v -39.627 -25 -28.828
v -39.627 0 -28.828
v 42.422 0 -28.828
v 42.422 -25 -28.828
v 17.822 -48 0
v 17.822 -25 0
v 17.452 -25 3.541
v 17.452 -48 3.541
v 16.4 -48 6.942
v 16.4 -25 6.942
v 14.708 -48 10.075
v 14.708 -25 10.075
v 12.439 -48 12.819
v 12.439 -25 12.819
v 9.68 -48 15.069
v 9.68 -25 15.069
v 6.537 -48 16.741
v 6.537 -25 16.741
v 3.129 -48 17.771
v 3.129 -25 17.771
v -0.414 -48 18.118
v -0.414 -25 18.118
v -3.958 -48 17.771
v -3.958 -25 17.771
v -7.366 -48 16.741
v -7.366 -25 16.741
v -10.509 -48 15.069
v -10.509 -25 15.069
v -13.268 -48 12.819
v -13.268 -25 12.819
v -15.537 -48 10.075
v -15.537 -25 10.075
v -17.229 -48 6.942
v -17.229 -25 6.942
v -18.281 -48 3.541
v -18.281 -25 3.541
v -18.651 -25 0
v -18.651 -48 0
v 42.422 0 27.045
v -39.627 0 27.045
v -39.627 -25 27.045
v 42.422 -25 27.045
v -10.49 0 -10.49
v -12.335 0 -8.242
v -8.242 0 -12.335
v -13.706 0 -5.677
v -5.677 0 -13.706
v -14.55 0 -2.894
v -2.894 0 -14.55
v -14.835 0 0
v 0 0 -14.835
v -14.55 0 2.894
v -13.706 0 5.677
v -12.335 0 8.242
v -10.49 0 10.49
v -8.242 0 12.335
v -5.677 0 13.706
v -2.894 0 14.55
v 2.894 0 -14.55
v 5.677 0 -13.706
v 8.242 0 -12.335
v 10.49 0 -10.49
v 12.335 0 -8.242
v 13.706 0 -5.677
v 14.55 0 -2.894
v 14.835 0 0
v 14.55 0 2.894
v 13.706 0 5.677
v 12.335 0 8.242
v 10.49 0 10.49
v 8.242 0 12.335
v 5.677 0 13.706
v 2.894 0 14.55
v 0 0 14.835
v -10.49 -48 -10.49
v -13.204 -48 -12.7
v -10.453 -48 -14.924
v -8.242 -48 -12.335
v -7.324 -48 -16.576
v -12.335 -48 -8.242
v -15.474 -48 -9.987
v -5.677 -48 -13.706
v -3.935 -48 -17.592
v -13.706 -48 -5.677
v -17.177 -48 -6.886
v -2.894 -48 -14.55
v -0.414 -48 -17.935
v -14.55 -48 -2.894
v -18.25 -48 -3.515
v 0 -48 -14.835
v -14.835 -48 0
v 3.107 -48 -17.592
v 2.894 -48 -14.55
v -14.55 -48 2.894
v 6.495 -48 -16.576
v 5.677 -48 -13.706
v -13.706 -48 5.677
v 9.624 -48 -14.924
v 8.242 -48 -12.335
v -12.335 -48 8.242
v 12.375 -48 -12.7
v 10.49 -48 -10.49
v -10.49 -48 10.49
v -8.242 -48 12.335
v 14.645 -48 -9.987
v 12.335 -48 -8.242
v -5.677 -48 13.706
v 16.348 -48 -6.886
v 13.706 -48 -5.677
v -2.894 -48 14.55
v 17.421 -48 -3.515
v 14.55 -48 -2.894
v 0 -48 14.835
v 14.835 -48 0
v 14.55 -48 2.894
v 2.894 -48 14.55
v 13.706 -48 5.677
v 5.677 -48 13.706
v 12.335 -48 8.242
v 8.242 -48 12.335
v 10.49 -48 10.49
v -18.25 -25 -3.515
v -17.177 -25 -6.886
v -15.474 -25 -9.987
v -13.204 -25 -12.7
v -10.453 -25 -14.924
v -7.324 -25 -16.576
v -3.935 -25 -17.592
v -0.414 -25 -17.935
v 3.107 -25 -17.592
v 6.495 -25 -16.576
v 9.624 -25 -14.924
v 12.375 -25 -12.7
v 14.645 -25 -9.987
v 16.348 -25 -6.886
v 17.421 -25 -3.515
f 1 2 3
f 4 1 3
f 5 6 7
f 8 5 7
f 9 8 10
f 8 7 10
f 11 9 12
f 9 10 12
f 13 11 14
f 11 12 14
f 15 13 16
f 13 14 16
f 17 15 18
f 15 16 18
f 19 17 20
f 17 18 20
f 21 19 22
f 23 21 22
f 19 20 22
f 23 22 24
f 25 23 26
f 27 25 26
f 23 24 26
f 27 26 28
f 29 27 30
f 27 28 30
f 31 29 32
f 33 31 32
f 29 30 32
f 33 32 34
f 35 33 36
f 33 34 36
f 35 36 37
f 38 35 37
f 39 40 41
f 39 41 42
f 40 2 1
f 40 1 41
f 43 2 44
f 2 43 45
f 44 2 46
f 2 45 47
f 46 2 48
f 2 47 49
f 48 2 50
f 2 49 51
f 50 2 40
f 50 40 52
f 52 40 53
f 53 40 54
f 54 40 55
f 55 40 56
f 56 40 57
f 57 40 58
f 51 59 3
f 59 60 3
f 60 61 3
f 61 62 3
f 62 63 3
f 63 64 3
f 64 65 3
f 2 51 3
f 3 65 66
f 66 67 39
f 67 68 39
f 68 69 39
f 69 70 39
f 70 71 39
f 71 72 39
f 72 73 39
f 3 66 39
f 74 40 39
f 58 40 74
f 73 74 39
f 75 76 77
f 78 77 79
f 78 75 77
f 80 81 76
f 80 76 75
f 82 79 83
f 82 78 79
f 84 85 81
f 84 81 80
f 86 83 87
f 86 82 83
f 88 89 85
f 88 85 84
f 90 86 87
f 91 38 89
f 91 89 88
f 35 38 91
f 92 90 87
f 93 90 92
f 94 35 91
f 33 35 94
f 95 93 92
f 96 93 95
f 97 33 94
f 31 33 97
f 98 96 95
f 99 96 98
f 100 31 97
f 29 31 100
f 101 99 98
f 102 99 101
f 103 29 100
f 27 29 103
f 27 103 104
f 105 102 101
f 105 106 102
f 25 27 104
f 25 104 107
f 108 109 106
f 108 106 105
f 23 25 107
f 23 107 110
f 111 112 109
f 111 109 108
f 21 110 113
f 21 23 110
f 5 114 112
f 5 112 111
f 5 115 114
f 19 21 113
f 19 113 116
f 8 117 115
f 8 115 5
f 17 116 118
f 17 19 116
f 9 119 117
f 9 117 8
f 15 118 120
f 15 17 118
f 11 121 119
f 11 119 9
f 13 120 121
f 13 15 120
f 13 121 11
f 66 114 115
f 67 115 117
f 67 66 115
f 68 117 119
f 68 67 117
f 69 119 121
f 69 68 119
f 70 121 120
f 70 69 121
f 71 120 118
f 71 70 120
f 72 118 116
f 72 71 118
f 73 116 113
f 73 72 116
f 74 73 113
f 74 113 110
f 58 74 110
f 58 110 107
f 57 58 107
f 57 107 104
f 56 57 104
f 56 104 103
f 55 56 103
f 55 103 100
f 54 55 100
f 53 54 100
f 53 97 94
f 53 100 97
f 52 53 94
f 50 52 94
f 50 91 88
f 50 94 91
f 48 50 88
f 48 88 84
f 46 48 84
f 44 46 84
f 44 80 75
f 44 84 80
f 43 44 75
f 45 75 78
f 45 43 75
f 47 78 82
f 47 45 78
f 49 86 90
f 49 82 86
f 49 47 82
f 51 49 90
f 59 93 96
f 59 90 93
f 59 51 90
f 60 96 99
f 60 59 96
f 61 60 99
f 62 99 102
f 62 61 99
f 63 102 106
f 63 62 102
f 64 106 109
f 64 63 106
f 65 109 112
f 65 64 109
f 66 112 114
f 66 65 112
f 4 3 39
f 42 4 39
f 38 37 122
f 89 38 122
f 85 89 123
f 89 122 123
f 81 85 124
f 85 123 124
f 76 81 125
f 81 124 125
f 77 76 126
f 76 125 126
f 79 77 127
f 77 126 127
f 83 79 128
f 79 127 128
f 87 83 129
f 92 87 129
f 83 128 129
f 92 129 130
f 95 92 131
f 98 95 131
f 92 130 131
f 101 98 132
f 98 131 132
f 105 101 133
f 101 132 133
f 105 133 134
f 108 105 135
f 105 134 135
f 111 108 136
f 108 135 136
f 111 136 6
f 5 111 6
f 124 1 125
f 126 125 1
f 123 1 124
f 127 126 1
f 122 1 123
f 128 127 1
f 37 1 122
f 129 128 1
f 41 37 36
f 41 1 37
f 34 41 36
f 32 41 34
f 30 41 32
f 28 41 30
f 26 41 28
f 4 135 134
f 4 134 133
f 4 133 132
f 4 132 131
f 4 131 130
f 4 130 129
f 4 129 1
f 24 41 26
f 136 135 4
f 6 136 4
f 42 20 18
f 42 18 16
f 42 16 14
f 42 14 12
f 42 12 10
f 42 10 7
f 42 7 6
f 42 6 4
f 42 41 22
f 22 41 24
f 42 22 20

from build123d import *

# Parameters (mm, degrees)
F0_W     = 82.048778
F0_H     = 55.873601
F0_R     = 14.069549
F1_DEPTH = 25
F3_DEPTH = 48
F4_R     = 14.835097
F5_DEPTH = 49


with BuildPart() as f1:
    # F0 (on Front) → F1 (new body)
    with BuildSketch(Plane.XZ):
        with Locations((1.397414, -0.891356)):
            Rectangle(F0_W, F0_H)
        Circle(F0_R, mode=Mode.SUBTRACT)
    extrude(amount=F1_DEPTH)

    # F2 (on Front) → F3 (join)
    with BuildSketch(Plane.XZ):
        with BuildLine():
            ThreePointArc((-18.651316, 0), (-0.414473, -17.935191), (17.82237, 0))
            ThreePointArc((17.82237, 0), (-0.414473, 18.118096), (-18.651316, 0))
        make_face()
    extrude(amount=F3_DEPTH)

    # F4 (on Front) → F5 (cut)
    with BuildSketch(Plane.XZ):
        Circle(F4_R)
    extrude(amount=F5_DEPTH, mode=Mode.SUBTRACT)


solid = f1.part
